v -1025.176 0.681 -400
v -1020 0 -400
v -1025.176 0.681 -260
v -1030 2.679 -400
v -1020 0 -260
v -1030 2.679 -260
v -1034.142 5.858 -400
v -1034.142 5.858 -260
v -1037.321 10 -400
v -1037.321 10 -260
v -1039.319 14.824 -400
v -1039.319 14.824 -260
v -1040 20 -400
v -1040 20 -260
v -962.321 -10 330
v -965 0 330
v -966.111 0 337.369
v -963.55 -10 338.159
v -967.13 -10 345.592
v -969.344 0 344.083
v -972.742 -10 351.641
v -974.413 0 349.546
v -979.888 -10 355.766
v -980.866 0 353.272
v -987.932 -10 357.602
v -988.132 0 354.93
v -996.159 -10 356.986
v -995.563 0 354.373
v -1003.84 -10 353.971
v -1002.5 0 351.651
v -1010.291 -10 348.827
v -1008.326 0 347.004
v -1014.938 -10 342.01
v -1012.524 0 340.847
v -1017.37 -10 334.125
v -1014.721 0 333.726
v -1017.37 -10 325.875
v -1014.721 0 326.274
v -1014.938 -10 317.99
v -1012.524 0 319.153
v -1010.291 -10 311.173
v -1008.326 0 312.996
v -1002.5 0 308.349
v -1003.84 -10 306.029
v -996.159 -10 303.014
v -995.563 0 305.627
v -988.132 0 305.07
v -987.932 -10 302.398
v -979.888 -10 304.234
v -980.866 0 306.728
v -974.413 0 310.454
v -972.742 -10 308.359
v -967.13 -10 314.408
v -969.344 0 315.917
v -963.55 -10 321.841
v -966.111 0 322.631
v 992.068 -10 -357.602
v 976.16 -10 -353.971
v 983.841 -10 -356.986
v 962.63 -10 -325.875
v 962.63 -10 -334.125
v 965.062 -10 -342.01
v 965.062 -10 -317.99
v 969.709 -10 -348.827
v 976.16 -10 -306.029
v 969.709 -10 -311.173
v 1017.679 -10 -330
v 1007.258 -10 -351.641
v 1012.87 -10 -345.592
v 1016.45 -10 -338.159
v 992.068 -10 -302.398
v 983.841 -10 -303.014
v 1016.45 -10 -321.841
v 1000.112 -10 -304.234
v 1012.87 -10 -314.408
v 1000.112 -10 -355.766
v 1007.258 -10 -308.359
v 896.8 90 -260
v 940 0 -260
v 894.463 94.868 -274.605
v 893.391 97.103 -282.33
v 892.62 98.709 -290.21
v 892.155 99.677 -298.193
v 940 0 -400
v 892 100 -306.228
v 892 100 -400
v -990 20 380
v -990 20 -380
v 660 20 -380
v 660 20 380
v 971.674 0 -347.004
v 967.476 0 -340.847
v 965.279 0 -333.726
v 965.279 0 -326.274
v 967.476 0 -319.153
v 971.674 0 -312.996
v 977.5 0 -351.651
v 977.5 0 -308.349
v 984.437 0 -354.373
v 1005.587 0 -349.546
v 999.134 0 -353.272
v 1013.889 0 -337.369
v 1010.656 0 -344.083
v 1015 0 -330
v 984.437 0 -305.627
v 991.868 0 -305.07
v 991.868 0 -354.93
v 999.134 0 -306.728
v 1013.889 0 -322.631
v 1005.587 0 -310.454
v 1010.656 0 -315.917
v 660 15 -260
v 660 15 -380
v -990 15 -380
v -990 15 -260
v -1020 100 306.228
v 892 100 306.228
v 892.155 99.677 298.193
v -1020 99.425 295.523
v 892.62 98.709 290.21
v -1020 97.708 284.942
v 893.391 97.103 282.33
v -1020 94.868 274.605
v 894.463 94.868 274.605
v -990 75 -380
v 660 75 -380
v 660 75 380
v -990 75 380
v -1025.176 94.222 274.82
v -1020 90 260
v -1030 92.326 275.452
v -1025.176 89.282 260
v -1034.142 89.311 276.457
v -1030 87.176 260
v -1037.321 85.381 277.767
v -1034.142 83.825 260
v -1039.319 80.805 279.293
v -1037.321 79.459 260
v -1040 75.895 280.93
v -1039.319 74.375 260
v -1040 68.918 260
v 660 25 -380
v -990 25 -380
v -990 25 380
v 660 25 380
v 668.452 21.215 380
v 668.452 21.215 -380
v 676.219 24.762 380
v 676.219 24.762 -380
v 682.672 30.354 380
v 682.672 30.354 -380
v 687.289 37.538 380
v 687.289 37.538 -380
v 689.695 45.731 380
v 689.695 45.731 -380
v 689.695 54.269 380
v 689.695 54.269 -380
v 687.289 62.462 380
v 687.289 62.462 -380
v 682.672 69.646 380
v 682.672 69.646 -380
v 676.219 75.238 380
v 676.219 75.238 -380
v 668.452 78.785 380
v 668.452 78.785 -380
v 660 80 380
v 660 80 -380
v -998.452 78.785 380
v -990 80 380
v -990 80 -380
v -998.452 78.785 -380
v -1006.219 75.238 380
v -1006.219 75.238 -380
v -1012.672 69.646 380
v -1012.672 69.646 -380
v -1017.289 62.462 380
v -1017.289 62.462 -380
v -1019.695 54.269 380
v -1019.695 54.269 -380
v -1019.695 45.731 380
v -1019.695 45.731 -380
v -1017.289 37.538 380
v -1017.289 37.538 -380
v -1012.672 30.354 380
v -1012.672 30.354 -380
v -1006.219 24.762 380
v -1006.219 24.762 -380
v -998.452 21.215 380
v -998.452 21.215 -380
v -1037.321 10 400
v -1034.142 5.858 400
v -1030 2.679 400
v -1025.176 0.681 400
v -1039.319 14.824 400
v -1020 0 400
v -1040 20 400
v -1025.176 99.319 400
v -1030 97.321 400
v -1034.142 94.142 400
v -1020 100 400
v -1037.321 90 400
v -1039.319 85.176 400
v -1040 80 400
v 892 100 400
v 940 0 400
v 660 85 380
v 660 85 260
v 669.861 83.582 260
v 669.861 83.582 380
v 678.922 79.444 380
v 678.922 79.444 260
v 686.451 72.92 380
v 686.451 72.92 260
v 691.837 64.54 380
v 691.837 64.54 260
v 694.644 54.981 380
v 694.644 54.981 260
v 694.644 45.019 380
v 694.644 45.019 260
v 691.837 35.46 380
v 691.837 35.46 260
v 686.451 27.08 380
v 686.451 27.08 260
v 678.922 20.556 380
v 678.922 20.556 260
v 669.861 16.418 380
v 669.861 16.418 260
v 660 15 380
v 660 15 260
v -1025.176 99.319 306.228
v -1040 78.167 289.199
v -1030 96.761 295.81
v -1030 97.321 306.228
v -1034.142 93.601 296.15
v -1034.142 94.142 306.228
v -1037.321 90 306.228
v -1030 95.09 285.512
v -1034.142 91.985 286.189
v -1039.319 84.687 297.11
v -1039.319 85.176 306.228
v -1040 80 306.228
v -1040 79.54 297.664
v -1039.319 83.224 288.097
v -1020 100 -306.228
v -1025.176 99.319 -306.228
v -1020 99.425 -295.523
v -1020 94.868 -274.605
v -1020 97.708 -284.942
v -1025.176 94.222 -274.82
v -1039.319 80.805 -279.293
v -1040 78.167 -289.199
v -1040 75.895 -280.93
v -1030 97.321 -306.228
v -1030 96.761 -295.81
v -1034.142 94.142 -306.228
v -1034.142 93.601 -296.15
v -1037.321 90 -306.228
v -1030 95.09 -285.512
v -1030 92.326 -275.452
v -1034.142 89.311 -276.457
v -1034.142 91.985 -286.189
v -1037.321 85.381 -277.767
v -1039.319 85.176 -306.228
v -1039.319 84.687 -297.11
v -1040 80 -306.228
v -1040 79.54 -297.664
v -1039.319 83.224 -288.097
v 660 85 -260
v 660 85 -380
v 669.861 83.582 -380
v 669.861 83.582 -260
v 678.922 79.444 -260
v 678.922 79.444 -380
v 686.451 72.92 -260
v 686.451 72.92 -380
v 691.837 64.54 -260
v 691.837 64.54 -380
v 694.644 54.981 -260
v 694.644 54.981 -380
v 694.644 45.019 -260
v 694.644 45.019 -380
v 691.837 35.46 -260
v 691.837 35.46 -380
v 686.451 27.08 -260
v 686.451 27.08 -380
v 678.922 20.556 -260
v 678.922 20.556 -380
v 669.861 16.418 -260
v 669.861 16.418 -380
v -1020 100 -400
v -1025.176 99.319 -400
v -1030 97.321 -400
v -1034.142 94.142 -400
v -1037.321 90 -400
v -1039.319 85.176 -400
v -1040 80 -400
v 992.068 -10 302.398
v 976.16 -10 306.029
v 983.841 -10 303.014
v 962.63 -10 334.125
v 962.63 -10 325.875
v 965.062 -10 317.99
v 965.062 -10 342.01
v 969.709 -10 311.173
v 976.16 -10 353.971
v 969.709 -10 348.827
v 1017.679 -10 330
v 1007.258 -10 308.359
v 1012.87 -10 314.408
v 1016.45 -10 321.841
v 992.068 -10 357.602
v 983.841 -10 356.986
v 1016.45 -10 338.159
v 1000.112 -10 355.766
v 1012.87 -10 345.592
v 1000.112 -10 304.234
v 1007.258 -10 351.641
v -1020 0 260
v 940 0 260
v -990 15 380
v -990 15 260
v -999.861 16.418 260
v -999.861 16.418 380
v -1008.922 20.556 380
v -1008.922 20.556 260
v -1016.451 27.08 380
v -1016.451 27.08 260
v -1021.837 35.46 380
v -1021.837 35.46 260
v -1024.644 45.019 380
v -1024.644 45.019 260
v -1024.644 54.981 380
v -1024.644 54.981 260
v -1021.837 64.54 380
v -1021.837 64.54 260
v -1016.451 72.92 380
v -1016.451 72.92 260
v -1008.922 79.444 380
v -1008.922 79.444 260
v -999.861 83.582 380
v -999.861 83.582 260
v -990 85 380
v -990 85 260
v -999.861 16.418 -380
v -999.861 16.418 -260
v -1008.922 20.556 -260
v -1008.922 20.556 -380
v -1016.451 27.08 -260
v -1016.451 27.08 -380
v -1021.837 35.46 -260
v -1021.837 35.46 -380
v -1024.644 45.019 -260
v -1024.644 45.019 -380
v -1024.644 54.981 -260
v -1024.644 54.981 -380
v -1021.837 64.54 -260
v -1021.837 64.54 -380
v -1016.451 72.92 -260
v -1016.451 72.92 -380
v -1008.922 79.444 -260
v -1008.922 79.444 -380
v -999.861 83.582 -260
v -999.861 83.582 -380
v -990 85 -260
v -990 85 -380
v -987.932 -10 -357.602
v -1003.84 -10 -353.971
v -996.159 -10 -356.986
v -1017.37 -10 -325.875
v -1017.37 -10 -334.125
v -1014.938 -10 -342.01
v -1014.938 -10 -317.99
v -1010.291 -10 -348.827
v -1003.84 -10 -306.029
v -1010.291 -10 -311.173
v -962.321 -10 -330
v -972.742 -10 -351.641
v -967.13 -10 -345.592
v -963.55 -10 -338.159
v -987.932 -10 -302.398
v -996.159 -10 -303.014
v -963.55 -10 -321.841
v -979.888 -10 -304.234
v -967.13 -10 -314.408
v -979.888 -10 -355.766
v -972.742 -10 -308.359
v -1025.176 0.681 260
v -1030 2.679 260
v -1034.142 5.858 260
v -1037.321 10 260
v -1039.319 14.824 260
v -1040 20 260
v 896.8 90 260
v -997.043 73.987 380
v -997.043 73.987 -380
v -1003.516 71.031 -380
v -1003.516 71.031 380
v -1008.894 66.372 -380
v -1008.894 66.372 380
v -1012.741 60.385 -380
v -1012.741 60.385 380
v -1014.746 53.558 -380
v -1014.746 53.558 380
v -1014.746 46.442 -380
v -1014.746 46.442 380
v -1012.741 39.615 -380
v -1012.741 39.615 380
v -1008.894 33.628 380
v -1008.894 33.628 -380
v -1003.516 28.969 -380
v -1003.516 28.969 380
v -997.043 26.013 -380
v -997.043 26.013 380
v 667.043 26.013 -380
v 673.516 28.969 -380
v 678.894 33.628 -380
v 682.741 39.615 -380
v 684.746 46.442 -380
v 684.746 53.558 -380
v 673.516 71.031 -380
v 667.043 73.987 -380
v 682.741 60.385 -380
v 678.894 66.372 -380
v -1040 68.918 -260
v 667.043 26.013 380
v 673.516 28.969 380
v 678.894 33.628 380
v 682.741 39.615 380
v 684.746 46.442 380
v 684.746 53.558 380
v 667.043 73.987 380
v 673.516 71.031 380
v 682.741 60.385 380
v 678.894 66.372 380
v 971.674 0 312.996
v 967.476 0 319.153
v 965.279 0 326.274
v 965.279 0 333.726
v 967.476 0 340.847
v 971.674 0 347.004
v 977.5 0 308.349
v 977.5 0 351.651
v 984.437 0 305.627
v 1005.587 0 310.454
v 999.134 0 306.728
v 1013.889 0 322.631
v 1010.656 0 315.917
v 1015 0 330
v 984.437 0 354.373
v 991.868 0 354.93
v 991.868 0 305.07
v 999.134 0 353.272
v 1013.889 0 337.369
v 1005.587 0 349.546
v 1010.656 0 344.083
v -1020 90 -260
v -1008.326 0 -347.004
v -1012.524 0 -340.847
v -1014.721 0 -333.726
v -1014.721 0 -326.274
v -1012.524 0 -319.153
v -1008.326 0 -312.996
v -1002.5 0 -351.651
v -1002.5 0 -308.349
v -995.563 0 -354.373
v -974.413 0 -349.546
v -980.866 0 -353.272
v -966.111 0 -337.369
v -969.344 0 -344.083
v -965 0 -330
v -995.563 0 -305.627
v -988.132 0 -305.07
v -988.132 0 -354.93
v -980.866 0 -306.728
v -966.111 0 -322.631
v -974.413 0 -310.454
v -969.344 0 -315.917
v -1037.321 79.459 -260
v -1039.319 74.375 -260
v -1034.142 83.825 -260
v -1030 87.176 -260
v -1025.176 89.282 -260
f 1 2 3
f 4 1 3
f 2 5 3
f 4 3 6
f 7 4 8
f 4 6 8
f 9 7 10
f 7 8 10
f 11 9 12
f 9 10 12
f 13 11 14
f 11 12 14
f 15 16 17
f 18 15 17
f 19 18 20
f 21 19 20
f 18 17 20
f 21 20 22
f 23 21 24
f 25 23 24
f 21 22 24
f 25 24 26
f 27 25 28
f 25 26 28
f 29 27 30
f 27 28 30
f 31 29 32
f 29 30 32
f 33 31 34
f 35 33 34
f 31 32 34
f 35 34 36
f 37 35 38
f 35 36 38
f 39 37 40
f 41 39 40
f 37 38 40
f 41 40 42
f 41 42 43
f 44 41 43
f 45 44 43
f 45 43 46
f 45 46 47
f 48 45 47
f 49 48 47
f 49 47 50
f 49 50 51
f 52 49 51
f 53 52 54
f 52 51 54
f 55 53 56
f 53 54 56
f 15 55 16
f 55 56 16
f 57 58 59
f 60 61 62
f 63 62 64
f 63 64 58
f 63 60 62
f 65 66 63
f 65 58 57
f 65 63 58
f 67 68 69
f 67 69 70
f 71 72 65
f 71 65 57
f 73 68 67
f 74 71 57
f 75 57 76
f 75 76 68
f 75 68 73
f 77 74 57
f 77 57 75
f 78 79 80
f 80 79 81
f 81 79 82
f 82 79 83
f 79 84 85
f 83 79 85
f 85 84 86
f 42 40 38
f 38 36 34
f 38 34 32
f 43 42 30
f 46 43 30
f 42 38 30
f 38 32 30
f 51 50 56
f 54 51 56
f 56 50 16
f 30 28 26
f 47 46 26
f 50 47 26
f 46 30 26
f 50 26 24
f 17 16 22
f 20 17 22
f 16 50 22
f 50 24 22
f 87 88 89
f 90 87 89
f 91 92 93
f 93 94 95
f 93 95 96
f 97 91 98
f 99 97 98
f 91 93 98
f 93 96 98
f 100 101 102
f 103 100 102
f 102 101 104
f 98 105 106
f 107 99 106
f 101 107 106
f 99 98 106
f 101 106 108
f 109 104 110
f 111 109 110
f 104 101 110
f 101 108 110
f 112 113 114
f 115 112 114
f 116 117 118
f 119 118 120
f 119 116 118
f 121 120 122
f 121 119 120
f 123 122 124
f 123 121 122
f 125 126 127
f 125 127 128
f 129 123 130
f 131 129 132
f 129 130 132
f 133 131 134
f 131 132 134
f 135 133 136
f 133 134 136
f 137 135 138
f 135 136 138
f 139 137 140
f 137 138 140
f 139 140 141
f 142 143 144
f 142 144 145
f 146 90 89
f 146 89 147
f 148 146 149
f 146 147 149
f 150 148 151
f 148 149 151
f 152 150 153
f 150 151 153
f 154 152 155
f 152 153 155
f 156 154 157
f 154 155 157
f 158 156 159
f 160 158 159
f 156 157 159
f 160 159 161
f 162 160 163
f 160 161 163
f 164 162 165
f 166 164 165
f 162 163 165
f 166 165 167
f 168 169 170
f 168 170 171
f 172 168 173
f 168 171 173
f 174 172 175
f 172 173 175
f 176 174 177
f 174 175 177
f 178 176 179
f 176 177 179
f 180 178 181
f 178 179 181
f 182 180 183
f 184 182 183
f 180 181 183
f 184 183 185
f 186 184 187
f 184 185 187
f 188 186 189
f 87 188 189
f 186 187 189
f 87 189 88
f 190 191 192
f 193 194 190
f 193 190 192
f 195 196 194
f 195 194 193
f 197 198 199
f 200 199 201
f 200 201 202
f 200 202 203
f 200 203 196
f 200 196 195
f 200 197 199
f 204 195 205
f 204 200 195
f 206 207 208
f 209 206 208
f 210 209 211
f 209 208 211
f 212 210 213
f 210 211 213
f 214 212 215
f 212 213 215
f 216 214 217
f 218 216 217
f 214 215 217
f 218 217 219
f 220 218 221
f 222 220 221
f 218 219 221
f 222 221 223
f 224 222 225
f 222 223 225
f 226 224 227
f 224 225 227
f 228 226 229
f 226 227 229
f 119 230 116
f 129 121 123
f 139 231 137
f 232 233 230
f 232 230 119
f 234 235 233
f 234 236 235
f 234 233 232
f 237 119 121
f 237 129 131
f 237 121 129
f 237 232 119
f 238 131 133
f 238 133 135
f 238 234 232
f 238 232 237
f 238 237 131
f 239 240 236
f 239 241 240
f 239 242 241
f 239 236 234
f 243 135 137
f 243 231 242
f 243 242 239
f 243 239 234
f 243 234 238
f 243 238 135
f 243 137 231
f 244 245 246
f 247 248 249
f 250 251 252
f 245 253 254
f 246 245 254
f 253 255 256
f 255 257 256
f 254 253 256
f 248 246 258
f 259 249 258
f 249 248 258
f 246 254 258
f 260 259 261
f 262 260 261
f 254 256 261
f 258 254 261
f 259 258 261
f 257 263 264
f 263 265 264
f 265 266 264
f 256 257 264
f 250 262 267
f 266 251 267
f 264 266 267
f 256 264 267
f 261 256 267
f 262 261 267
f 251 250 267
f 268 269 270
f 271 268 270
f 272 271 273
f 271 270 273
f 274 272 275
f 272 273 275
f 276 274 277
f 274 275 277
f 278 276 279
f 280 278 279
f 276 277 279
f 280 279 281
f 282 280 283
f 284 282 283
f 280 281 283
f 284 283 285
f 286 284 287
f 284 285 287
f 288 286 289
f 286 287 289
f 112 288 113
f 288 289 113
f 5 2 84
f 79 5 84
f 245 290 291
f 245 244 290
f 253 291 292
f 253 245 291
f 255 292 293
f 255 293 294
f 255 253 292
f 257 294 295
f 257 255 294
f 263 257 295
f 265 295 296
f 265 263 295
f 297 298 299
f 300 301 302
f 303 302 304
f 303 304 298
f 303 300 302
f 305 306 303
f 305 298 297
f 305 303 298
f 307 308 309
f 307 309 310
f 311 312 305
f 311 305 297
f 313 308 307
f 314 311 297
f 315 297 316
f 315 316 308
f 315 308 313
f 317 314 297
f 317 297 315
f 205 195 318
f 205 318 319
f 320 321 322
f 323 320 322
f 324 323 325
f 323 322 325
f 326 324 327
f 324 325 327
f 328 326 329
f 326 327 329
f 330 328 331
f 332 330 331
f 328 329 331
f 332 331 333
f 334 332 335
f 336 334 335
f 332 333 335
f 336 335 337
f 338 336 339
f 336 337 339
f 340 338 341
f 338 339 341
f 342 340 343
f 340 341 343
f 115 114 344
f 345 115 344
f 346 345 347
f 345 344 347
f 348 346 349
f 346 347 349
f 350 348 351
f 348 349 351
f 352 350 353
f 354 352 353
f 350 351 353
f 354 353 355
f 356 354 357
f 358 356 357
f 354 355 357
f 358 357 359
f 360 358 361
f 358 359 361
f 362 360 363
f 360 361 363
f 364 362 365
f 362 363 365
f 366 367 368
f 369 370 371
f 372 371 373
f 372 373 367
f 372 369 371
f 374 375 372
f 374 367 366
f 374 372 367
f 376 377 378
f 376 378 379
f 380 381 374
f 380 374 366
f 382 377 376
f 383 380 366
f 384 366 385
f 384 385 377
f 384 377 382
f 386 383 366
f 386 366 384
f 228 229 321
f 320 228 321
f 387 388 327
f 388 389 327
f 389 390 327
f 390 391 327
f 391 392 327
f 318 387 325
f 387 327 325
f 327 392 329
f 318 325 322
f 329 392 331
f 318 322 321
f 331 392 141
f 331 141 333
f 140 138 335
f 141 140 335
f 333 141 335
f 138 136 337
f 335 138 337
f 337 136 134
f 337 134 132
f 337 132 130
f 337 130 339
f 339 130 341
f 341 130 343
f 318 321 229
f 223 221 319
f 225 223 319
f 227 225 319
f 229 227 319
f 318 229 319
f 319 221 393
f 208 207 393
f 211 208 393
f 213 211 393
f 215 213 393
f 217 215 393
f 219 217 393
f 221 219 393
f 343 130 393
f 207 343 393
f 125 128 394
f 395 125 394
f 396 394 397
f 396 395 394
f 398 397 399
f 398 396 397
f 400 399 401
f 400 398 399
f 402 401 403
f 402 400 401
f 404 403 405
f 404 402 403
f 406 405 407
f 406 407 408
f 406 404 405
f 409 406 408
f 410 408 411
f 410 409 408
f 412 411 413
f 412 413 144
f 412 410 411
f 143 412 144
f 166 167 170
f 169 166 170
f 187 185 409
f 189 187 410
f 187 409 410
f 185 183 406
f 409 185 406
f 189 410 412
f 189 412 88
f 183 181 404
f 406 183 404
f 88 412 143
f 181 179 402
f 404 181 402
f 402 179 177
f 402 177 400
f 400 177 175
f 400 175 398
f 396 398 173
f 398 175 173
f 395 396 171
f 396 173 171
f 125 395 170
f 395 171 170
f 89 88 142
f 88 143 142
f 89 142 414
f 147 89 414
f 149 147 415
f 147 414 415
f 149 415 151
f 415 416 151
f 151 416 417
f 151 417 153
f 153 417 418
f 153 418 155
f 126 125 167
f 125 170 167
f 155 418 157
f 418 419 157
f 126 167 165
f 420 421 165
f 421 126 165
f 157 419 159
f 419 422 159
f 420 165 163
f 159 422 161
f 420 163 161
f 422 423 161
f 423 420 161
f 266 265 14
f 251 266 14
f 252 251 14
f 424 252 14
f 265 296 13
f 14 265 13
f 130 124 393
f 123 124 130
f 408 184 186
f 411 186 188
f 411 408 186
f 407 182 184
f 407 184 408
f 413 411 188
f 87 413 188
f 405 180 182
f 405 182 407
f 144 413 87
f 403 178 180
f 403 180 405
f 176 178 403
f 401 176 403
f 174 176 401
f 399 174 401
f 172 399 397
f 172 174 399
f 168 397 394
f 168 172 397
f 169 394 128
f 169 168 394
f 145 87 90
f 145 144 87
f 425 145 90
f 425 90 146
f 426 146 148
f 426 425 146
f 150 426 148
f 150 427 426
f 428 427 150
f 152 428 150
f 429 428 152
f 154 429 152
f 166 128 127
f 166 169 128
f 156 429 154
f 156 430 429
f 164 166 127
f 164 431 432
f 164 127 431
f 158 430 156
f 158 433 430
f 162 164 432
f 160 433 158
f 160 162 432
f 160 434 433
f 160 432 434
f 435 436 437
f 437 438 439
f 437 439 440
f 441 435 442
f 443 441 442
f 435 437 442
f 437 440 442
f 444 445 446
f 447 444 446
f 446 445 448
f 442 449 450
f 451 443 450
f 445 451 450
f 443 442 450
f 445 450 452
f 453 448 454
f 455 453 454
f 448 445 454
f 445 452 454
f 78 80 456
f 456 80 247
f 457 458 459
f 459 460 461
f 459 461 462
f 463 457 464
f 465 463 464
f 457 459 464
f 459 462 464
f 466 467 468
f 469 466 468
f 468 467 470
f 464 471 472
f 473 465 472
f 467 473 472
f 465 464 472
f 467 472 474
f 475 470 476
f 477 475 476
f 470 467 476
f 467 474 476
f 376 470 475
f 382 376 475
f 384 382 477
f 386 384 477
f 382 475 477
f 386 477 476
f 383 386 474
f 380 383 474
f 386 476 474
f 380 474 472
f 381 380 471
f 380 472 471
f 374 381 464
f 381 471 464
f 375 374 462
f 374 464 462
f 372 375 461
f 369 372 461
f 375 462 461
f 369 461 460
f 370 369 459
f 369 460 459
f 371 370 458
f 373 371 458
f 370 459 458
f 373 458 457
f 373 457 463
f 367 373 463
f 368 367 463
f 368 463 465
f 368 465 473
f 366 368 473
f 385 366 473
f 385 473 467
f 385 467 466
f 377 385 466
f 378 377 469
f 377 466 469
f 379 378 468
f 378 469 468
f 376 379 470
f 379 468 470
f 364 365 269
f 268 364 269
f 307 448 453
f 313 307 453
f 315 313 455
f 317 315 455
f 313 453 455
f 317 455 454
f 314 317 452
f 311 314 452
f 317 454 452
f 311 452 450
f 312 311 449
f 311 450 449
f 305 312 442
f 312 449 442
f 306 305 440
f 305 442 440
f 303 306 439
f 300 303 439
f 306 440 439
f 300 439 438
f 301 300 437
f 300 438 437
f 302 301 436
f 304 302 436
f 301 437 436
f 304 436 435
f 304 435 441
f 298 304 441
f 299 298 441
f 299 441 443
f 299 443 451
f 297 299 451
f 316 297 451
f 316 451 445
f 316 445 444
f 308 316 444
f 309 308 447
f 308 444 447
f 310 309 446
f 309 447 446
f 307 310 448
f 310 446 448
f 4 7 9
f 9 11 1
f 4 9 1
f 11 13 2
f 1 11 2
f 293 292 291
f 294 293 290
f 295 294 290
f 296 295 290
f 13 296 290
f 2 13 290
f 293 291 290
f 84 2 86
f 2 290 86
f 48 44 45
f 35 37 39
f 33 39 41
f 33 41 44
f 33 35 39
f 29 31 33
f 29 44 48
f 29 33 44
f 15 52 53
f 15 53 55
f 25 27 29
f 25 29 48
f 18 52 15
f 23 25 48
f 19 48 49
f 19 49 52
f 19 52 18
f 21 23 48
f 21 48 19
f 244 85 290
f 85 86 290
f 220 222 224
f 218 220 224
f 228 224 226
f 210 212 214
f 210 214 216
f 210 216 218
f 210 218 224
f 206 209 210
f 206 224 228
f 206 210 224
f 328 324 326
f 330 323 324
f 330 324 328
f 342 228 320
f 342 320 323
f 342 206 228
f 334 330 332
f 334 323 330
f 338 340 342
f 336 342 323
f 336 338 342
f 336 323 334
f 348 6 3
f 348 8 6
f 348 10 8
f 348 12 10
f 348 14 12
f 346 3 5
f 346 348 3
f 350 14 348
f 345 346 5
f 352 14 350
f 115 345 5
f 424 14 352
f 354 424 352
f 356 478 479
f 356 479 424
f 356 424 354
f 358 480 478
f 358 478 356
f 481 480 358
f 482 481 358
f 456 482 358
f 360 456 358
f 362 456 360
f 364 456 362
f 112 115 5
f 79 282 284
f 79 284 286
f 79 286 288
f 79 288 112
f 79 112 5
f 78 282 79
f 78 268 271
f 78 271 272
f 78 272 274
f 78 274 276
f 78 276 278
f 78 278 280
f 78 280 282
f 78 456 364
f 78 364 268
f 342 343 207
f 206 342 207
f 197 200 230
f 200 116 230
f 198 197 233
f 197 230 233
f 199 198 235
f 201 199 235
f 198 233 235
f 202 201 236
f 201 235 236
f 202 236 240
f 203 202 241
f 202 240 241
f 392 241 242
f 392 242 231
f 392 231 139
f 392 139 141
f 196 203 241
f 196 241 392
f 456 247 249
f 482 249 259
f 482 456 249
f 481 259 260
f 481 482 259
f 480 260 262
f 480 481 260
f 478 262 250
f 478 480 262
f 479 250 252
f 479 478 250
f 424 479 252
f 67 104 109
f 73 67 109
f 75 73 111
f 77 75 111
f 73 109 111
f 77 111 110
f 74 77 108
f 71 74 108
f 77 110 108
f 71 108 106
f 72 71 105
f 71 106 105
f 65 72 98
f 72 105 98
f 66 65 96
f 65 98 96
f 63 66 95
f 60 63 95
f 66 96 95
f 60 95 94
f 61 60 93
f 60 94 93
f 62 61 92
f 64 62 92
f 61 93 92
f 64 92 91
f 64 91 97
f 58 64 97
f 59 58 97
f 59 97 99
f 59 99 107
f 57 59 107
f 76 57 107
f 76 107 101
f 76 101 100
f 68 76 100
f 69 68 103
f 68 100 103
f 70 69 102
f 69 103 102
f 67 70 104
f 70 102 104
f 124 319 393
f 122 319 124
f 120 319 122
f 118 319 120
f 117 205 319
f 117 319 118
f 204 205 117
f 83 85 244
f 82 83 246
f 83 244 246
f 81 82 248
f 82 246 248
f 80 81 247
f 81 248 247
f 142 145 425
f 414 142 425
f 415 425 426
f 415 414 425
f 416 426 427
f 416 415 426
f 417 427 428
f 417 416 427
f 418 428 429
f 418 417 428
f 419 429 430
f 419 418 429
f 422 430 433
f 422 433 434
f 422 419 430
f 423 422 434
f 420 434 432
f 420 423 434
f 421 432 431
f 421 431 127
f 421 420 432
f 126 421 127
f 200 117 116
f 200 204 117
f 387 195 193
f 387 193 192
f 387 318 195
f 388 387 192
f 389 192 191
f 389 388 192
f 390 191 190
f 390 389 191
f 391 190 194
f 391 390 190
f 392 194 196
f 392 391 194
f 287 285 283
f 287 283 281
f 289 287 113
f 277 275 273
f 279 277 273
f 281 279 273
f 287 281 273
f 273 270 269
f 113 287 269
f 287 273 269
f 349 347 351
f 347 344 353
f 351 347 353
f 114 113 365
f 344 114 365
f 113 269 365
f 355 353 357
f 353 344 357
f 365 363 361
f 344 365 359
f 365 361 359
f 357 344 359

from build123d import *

# Parameters (mm, degrees)
BOSS_EXTRUDE1_DEPTH            = 140
CHAMFER1_SIZE                  = 10
CHAMFER1_SIZE2                 = 30
FILLET1_R                      = 100
FILLET2_R                      = 20
CUT_EXTRUDE1_DEPTH             = 380
CUT_EXTRUDE1_DEPTH_BACK        = 380
BOSS_EXTRUDE4_DEPTH            = 760
SKETCH31_R                     = 25
BOSS_EXTRUDE13_DEPTH           = 10
BOSS_EXTRUDE13_DRAFT           = -15
BOSS_EXTRUDE13_PROFILE_2_DEPTH = 10
BOSS_EXTRUDE13_PROFILE_2_DRAFT = -15
BOSS_EXTRUDE13_PROFILE_3_DEPTH = 10
BOSS_EXTRUDE13_PROFILE_3_DRAFT = -15
BOSS_EXTRUDE13_PROFILE_4_DEPTH = 10
BOSS_EXTRUDE13_PROFILE_4_DRAFT = -15


with BuildPart() as part:
    # Sketch2 → Boss-Extrude1 (new body)
    with BuildSketch(Plane.XY.offset(400)):
        Polygon((-1040, 0), (940, 0), (892, 100), (-1040, 100), align=None)
    extrude(amount=-BOSS_EXTRUDE1_DEPTH)

    # Chamfer1
    chamfer1_edges = [part.edges().sort_by_distance(p)[0] for p in [
        (-74, 100, 260),
    ]]
    chamfer1_side = [part.faces().sort_by_distance(p)[0] for p in [
        (-61.950920245, 49.795501022, 260),
    ]]
    chamfer(chamfer1_edges, length=CHAMFER1_SIZE, length2=CHAMFER1_SIZE2, reference=chamfer1_side[0])

    # Fillet1
    fillet1_edges = [part.edges().sort_by_distance(p)[0] for p in [
        (-74, 100, 290),
    ]]
    fillet(fillet1_edges, radius=FILLET1_R)

    # Fillet2
    fillet2_edges = [part.edges().sort_by_distance(p)[0] for p in [
        (-1040, 100, 353.113883008),
        (-1040, 92.434164903, 267.302494708),
        (-1040, 98.708745764, 290.209541716),
        (-1040, 0, 330),
    ]]
    fillet(fillet2_edges, radius=FILLET2_R)


with BuildPart() as body_2:
    # Mirror2: mirrored copy
    add(part.part.mirror(Plane.XY))


with BuildPart() as cut_extrude1_tool:
    # Sketch12 → Cut-Extrude1 (new, two sides: drawn at the far end of the back side and taken through both)
    with BuildSketch(Plane.XY.offset(-CUT_EXTRUDE1_DEPTH_BACK)):
        with BuildLine():
            Line((-990, 85), (660, 85))
            ThreePointArc((660, 85), (695, 50), (660, 15))
            Line((660, 15), (-990, 15))
            ThreePointArc((-990, 15), (-1025, 50), (-990, 85))
        make_face()
    extrude(amount=CUT_EXTRUDE1_DEPTH + CUT_EXTRUDE1_DEPTH_BACK)


with BuildPart() as part_1:
    add(part.part)

    # Cut-Extrude1: cut by cut_extrude1_tool
    add(cut_extrude1_tool.part, mode=Mode.SUBTRACT)


with BuildPart() as body_2_1:
    add(body_2.part)

    # Cut-Extrude1: cut by cut_extrude1_tool
    add(cut_extrude1_tool.part, mode=Mode.SUBTRACT)


with BuildPart() as body_3:
    # Sketch13 → Boss-Extrude4 (new body)
    with BuildSketch(Plane.XY.offset(-380)):
        with BuildLine():
            Line((-990, 20), (660, 20))
            ThreePointArc((660, 20), (690, 50), (660, 80))
            Line((660, 80), (-990, 80))
            ThreePointArc((-990, 80), (-1020, 50), (-990, 20))
        make_face()
        with BuildLine():
            Line((-990, 25), (660, 25))
            ThreePointArc((660, 25), (685, 50), (660, 75))
            Line((660, 75), (-990, 75))
            ThreePointArc((-990, 75), (-1015, 50), (-990, 25))
        make_face(mode=Mode.SUBTRACT)
    extrude(amount=BOSS_EXTRUDE4_DEPTH)


with BuildPart() as body_4:
    # Sketch31 → Boss-Extrude13 (with draft: the straight prism first)
    with BuildSketch(Plane.XZ):
        with Locations((-990, 330)):
            Circle(SKETCH31_R)
    extrude(amount=BOSS_EXTRUDE13_DEPTH)
    # Boss-Extrude13: the draft: its side faces are tilted about the plane it starts from
    boss_extrude13_sides = [body_4.faces().sort_by_distance(p)[0] for p in [
        (-1015, -5, 330),
    ]]
    draft(boss_extrude13_sides, Plane.XZ, BOSS_EXTRUDE13_DRAFT)


with BuildPart() as body_5:
    # Sketch31 → Boss-Extrude13 profile 2 (with draft: the straight prism first)
    with BuildSketch(Plane.XZ):
        with Locations((-990, -330)):
            Circle(SKETCH31_R)
    extrude(amount=BOSS_EXTRUDE13_PROFILE_2_DEPTH)
    # Boss-Extrude13 profile 2: the draft: its side faces are tilted about the plane it starts from
    boss_extrude13_profile_2_sides = [body_5.faces().sort_by_distance(p)[0] for p in [
        (-1015, -5, -330),
    ]]
    draft(boss_extrude13_profile_2_sides, Plane.XZ, BOSS_EXTRUDE13_PROFILE_2_DRAFT)


with BuildPart() as body_6:
    # Sketch31 → Boss-Extrude13 profile 3 (with draft: the straight prism first)
    with BuildSketch(Plane.XZ):
        with Locations((990, -330)):
            Circle(SKETCH31_R)
    extrude(amount=BOSS_EXTRUDE13_PROFILE_3_DEPTH)
    # Boss-Extrude13 profile 3: the draft: its side faces are tilted about the plane it starts from
    boss_extrude13_profile_3_sides = [body_6.faces().sort_by_distance(p)[0] for p in [
        (965, -5, -330),
    ]]
    draft(boss_extrude13_profile_3_sides, Plane.XZ, BOSS_EXTRUDE13_PROFILE_3_DRAFT)


with BuildPart() as body_7:
    # Sketch31 → Boss-Extrude13 profile 4 (with draft: the straight prism first)
    with BuildSketch(Plane.XZ):
        with Locations((990, 330)):
            Circle(SKETCH31_R)
    extrude(amount=BOSS_EXTRUDE13_PROFILE_4_DEPTH)
    # Boss-Extrude13 profile 4: the draft: its side faces are tilted about the plane it starts from
    boss_extrude13_profile_4_sides = [body_7.faces().sort_by_distance(p)[0] for p in [
        (965, -5, 330),
    ]]
    draft(boss_extrude13_profile_4_sides, Plane.XZ, BOSS_EXTRUDE13_PROFILE_4_DRAFT)


solid = Compound([part_1.part, body_2_1.part, body_3.part, body_4.part, body_5.part, body_6.part, body_7.part])
